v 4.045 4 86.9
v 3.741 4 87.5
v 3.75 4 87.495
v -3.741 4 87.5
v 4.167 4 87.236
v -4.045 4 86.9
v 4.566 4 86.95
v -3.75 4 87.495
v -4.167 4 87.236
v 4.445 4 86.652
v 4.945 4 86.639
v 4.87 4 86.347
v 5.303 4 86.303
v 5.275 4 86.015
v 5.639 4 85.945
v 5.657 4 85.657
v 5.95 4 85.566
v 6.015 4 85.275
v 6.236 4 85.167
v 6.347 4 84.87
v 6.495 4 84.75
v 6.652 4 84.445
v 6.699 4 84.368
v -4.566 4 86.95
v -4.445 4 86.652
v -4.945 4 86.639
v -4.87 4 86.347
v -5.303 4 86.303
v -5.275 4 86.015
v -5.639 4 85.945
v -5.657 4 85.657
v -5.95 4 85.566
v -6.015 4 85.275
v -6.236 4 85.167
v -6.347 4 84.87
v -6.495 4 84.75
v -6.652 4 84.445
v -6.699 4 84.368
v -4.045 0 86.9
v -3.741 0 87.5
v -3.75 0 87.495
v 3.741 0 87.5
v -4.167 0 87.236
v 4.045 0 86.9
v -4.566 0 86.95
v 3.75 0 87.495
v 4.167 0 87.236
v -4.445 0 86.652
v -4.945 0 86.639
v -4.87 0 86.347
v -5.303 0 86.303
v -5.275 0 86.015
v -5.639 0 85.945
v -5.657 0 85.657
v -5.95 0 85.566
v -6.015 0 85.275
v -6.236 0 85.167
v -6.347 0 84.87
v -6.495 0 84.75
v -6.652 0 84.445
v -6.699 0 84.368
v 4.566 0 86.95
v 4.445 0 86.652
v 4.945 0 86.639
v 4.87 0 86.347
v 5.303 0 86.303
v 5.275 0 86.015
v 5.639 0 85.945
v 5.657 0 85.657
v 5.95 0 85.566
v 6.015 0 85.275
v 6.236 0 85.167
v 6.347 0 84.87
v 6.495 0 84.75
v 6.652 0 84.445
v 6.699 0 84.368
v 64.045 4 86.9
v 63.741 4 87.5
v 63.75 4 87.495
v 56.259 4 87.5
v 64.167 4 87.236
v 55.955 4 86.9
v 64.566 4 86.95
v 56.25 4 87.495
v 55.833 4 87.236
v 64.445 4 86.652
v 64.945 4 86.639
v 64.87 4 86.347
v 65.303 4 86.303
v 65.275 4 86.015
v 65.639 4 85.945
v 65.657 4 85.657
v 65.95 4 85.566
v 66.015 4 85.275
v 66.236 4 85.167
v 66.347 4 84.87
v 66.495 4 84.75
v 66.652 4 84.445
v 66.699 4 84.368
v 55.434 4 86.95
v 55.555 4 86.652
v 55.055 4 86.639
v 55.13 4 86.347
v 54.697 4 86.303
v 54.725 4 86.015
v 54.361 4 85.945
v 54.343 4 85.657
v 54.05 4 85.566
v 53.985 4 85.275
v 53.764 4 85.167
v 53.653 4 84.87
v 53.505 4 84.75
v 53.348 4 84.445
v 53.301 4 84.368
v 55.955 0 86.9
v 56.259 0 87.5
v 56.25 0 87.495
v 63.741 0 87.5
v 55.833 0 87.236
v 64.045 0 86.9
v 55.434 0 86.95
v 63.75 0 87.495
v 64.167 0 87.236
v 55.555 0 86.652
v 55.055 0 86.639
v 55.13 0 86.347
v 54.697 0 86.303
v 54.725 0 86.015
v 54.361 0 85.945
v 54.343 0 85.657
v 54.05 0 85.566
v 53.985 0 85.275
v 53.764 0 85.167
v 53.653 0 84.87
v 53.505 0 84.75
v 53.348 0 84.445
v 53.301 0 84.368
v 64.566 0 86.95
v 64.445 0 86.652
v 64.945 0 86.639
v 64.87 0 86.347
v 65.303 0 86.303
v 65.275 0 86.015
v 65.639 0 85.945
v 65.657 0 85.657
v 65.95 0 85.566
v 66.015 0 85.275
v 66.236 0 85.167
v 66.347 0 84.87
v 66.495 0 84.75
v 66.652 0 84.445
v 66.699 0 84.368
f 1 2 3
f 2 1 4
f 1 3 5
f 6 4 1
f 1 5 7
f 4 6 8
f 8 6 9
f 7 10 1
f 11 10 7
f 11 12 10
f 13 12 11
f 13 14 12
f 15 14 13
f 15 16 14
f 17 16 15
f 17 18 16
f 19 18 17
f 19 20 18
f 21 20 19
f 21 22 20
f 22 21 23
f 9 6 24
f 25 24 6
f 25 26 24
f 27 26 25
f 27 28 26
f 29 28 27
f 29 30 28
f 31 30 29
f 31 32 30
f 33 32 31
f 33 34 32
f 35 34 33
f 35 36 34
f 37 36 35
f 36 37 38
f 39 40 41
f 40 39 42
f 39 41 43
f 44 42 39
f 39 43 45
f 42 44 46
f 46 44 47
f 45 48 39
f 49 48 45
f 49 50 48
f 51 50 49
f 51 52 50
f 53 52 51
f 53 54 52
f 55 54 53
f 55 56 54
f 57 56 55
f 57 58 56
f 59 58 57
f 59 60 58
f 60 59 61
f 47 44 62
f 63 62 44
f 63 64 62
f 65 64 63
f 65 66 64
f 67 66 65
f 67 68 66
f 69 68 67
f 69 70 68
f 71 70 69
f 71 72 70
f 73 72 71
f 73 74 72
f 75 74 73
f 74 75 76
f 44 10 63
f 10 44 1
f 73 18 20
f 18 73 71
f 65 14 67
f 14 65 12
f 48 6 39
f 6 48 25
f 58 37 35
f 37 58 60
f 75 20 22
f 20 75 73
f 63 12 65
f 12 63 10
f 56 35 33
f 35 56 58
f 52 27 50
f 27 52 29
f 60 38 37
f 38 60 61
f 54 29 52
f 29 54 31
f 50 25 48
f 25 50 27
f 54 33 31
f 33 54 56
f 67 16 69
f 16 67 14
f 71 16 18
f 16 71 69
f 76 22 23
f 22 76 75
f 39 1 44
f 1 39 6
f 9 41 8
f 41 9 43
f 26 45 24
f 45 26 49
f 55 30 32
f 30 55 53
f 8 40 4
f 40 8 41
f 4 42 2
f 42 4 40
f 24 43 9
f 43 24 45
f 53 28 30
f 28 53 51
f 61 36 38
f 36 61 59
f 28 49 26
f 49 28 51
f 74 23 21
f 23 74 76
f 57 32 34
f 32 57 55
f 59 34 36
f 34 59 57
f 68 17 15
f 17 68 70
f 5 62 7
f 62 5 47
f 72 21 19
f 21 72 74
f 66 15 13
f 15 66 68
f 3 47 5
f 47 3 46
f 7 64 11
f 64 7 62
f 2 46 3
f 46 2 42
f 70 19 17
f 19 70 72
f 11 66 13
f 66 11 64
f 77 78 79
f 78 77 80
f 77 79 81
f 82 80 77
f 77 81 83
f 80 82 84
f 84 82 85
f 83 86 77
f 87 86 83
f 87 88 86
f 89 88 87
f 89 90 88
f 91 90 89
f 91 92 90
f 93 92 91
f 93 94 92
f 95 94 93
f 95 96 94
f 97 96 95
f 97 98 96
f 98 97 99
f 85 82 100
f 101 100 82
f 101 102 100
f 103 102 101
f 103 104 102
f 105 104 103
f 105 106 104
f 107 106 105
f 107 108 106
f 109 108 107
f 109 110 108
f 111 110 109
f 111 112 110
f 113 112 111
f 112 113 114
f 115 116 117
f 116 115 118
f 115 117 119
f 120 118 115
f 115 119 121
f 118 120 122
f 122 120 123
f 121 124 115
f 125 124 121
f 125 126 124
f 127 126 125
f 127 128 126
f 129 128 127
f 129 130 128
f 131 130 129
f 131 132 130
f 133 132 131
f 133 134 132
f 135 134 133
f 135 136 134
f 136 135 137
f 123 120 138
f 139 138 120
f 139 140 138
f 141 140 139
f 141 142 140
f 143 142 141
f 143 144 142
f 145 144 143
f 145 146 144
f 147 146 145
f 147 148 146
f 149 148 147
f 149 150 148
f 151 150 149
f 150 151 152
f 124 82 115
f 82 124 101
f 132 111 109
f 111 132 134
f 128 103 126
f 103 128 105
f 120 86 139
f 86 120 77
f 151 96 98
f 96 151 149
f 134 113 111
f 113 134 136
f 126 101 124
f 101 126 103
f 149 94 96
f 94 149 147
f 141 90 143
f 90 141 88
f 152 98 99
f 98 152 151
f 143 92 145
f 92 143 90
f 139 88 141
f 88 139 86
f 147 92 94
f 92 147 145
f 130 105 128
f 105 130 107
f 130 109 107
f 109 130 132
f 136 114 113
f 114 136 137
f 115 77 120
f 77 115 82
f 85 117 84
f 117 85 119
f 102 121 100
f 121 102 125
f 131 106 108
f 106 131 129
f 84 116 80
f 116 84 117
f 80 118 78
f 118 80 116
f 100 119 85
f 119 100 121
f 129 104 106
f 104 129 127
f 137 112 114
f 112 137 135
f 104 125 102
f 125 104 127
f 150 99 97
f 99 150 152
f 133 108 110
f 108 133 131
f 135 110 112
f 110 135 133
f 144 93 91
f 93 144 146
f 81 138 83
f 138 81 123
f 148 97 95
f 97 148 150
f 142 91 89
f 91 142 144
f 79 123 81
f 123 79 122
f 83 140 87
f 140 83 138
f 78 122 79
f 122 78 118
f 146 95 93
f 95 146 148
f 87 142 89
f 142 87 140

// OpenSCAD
// file: ../stage.scad
// ============================================================
//  Positioning stage: base (X dovetail) -> x-slider with column
//  (Z dovetail) -> z-slider (payload face toward +Y) + column cap.
//  Every axis: M3 adjust screw captured in the fixed part by head +
//  nylock, threading into a captive nut in the moving part
//  (0.5 mm/turn, both directions), plus an M3 lock screw.
//  Modules model parts in stage-local coordinates at mid travel.
// ============================================================
include <lib.scad>

// Dovetail standing on the column's +Y face, running along Z.
// multmatrix maps (x,y,z) -> (y,z,x): run->Z, width->X, height->Y.
module zrail_frame() { multmatrix([[0,1,0,0],[0,0,1,0],[1,0,0,0]]) children(); }

module stage_base() {
    rail_x0 = -stage_L / 2;
    rail_len = stage_L - stage_tab_t;
    tab_h = stage_base_h + xs_screw_z + 6;
    difference() {
        union() {
            translate([-stage_L / 2, -stage_D / 2, 0]) cube([stage_L, stage_D, stage_base_h]);
            translate([rail_x0, 0, stage_base_h]) dovetail_rail(rail_len);
            // adjust-screw tab
            translate([stage_L / 2 - stage_tab_t, -8, 0]) cube([stage_tab_t, 16, tab_h]);
        }
        wood_screw_holes(stage_mount_pts, stage_base_h, cbore = 3);
        // X adjust screw through tab (head outside, nylock inside)
        translate([stage_L / 2 - stage_tab_t - 1, 0, stage_base_h + xs_screw_z])
            rotate([0, 90, 0]) screw_hole(m3_d, stage_tab_t + 2);
    }
}

// Upper stack shares the x-slider's X offset.
module stage_x_slider() {
    x0 = xs_xc - xs_len / 2;
    difference() {
        union() {
            translate([x0, -xs_w / 2, stage_base_h]) cube([xs_len, xs_w, xs_h]);
            // column
            translate([xs_xc - col_w / 2, col_y0, xs_top - 0.01]) cube([col_w, col_t, col_h + 0.01]);
            translate([xs_xc, col_y1, xs_top]) zrail_frame() dovetail_rail(col_h);
        }
        translate([x0 - 1, 0, stage_base_h]) dovetail_slot(xs_len + 2);
        // X adjust: screw enters +X face, nut dropped in from the top
        translate([x0 + xs_len + 0.01, 0, stage_base_h + xs_screw_z]) rotate([0, -90, 0])
            screw_hole(m3_d, xs_adj_hole);
        translate([x0 + xs_len - 6 - m3_nut_t / 2, -(m3_nut_af + clr) / 2, stage_base_h + xs_screw_z - 3.5])
            cube([m3_nut_t + 0.4, m3_nut_af + clr, xs_h]);
        // X lock: horizontal from +Y face onto rail flank, nut from top
        translate([xs_xc + 8, xs_w / 2 + 0.01, stage_base_h + 2.5]) rotate([90, 0, 0])
            screw_hole(m3_d, xs_w / 2 - 3);
        translate([xs_xc + 8 - (m3_nut_af + clr) / 2, 9 - (m3_nut_t + 0.4) / 2, stage_base_h + 2.5 - 3.3])
            cube([m3_nut_af + clr, m3_nut_t + 0.4, xs_h]);
        // cap screws (tapped into column top)
        for (sx = [-8, 8]) translate([xs_xc + sx, col_y0 + 5, col_top - 10])
            screw_hole(m3_tap, 10.1);
    }
}

module stage_z_slider() {
    y0 = col_y1;
    x0 = xs_xc - zs_w / 2;
    difference() {
        translate([x0, y0, zs_z0]) cube([zs_w, zs_t, zs_h]);
        translate([xs_xc, col_y1, zs_z0 - 1]) zrail_frame() dovetail_slot(zs_h + 2);
        // payload holes + nut slots from the bottom
        for (p = payload_pts) {
            translate([xs_xc + p[0], payload_face_y + 0.01, stage_payload_z + p[1]])
                rotate([90, 0, 0]) screw_hole(m3_d, 7.5);
            translate([xs_xc + p[0] - (m3_nut_af + clr) / 2, payload_face_y - 4 - (m3_nut_t + 0.4) / 2, zs_z0 - 1])
                cube([m3_nut_af + clr, m3_nut_t + 0.4, zs_h / 2 + 1 + 3.3]);
        }
        // Z adjust: through hole, nut slot from the -X side 5 below the top
        translate([xs_xc + zs_screw_x, zs_screw_y, zs_z0 + zs_h - zs_adj_hole]) screw_hole(m3_d, zs_adj_hole + 0.1);
        translate([x0 - 1, zs_screw_y - (m3_nut_af + clr) / 2, zs_z0 + zs_h - 5 - (m3_nut_t + 0.4) / 2])
            cube([zs_screw_x + zs_w / 2 + 1 + (m3_nut_af + clr) / 2, m3_nut_af + clr, m3_nut_t + 0.4]);
        // Z lock: from the +X (outward) side onto the rail flank, nut dropped in from the top
        lz = zs_z0 + zs_h - 5;
        x1 = x0 + zs_w;
        translate([x1 + 0.01, col_y1 + 2, lz]) rotate([0, -90, 0]) screw_hole(m3_d, zs_w / 2 - 4);
        translate([x1 - 2.5 - (m3_nut_t + 0.4), col_y1 + 2 - zl_pocket_w / 2, lz - (m3_nut_af + clr) / 2 / cos(30)])
            cube([m3_nut_t + 0.4, zl_pocket_w, zs_h]);
    }
}

module stage_z_cap() {
    difference() {
        // stops 1 mm short of the payload face so the payload never rubs it
        translate([xs_xc - col_w / 2, col_y0, col_top]) cube([col_w, payload_face_y - col_y0 - 1, cap_t]);
        for (sx = [-8, 8]) translate([xs_xc + sx, col_y0 + 5, col_top]) screw_hole(m3_d, cap_t);
        translate([xs_xc + zs_screw_x, zs_screw_y, col_top]) screw_hole(m3_d, cap_t);
    }
}

// ---- placed at a fine-travel offset (dx, dz) ----
module stage_x_slider_placed(dx = 0) { translate([dx, 0, 0]) stage_x_slider(); }
module stage_z_cap_placed(dx = 0)    { translate([dx, 0, 0]) stage_z_cap(); }
module stage_z_slider_placed(dx = 0, dz = 0) { translate([dx, 0, dz]) stage_z_slider(); }

// Children placed at the payload face centre (origin on the face, +Y out).
module stage_payload_origin(dx = 0, dz = 0) {
    translate([xs_xc + dx, payload_face_y, stage_payload_z + dz]) children();
}

// Optional mirror (tower B) wraps the stage-local geometry.
module stage_hand(mir) { if (mir) mirror([1, 0, 0]) children(); else children(); }

module stage_assembly(dx = 0, dz = 0) {
    color("SteelBlue") stage_base();
    color("LightSteelBlue") stage_x_slider_placed(dx);
    color("SkyBlue") stage_z_cap_placed(dx);
    color("CadetBlue") stage_z_slider_placed(dx, dz);
}

// ---- travel checks ----
_right_gap = (stage_L / 2 - stage_tab_t) - (xs_xc + xs_len / 2) - locknut_t;
_left_ok   = 10;   // slider may overhang the rail start by up to 10 mm
echo("CHECK", "stage_travel_x", 2 * min(_right_gap, _left_ok));
// adjust screws: head on the fixed tab/cap, tip must pass the moving nut
// at the far travel end and stay inside the hole at the near end
_xnut = xs_xc + xs_len / 2 - 6;                  // nut centre X at mid
_xtip = stage_L / 2 - x_adj_len;
echo("CHECK", "x_adj_engage", (_xnut - stage_travel - (m3_nut_t + 0.4) / 2) - _xtip);
echo("CHECK", "x_adj_hole", _xtip - (xs_xc + xs_len / 2 + stage_travel - xs_adj_hole));
_znut = zs_z0 + zs_h - 5;
_ztip = stage_top_z - z_adj_len;
echo("CHECK", "z_adj_engage", (_znut - stage_travel - (m3_nut_t + 0.4) / 2) - _ztip);
echo("CHECK", "z_adj_hole", _ztip - (zs_z0 + zs_h + stage_travel - zs_adj_hole));
echo("CHECK", "z_lock_pocket_w", zl_pocket_w);
echo("CHECK", "stage_travel_z", 2 * min(stage_gap_z, cap_gap - locknut_t));
// file: ../axes.scad
// ============================================================
//  Plug carriage: X base (fixed, X servo) -> X carriage (rack on
//  its -Y face, Y servo) -> Y carriage (rack on its -X face, male
//  stage pad, cable pillar).
//  World coords; carriage modules take x_pos (plug X) / y_pos.
// ============================================================
include <stage.scad>

runner_w = 10;     // plain (non-dovetail) rear X runner
runner_h = dt_h;

// ---------------- X base ----------------
xb_x0 = x_rail_x0 - 6;
xb_x1 = x_rail_x0 + x_rail_len + 6;
xb_y0 = x_shaft_y - servo_body[0] + servo_shaft_off - 12;
xb_y1 = xc_y1;
xb_screws = [[xb_x0 + 7, xb_y0 + 7], [xb_x1 - 7, xb_y0 + 7],
             [xb_x0 + 7, xb_y1 - 7], [xb_x1 - 7, xb_y1 - 7],
             [(xb_x0 + xb_x1) / 2, xb_y1 - 7]];

module x_servo_holder_world() {
    at_inverted_servo(x_shaft_x, x_shaft_y, x_pinion_z0, 90) mg995_holder();
}
// Holder floor-screw holes, mapped from the holder frame to the floor.
module x_holder_floor_holes() {
    at_inverted_servo(x_shaft_x, x_shaft_y, x_pinion_z0, 90) translate([0, 0, holder_floor_up])
        mirror([0, 0, 1]) translate([0, 0, -xb_t]) holder_floor_holes(xb_t);
}
module x_servo_world() {
    at_inverted_servo(x_shaft_x, x_shaft_y, x_pinion_z0, 90) mg995_model();
    x_servo_holder_world();
}
module x_pinion_world() {
    translate([x_shaft_x, x_shaft_y, x_pinion_z0]) color("Gold") pinion();
}

module x_base() {
    difference() {
        union() {
            translate([xb_x0, xb_y0, 0]) cube([xb_x1 - xb_x0, xb_y1 - xb_y0, xb_t]);
            translate([x_rail_x0, x_rail_y[1], xb_t]) dovetail_rail(x_rail_len);
            translate([x_rail_x0, x_rail_y[0] - runner_w / 2, xb_t - 0.01])
                cube([x_rail_len, runner_w, runner_h + 0.01]);
        }
        wood_screw_holes(xb_screws, xb_t, cbore = 2);
        x_holder_floor_holes();
        // pinion clearance pocket (keeps the plate clear of the gear)
        translate([x_shaft_x, x_shaft_y, xb_t - 1]) cylinder(r = pinion_pd / 2 + gear_mod + 1, h = 2);
        // servo-lead exit notch at the rear edge, plus zip-tie slots
        translate([x_shaft_x - 6, xb_y0 - 1, -1]) cube([12, 8, xb_t + 2]);
        for (dx = [-10, 10]) translate([x_shaft_x + dx - 1.5, xb_y0 + 12, -1]) cube([3, 5, xb_t + 2]);
    }
}

// ---------------- X carriage (modelled at x_pos = 0) ----------------
module y_servo_holder_local() {
    at_inverted_servo(y_shaft_x_rel, y_shaft_y, y_pinion_z0, 90) mg995_holder();
}
module y_holder_floor_holes() {
    at_inverted_servo(y_shaft_x_rel, y_shaft_y, y_pinion_z0, 90) translate([0, 0, holder_floor_up])
        mirror([0, 0, 1]) translate([0, 0, -xc_h]) holder_floor_holes(xc_h);
}
module y_servo_local() {
    at_inverted_servo(y_shaft_x_rel, y_shaft_y, y_pinion_z0, 90) mg995_model();
}

module x_carriage() {
    difference() {
        union() {
            translate([xc_x0, xc_y0, xc_z0]) cube([xc_len, xc_y1 - xc_y0, xc_h]);
            // X rack on the -Y face, teeth toward -Y
            translate([xc_x0, xc_y0 + 0.01, x_rack_z0]) mirror([0, 1, 0]) rack(xc_len, base_h = rack_base);
            // Y rail on top, under the Y carriage
            translate([-xs_xc, xc_y0, xc_top]) rotate([0, 0, 90]) dovetail_rail(xc_y1 - xc_y0);
        }
        y_holder_floor_holes();
        translate([xc_x0 - 1, x_rail_y[1], xc_z0]) dovetail_slot(xc_len + 2);
        translate([xc_x0 - 1, x_rail_y[0] - runner_w / 2 - clr - 0.15, xc_z0 - 1])
            cube([xc_len + 2, runner_w + 2 * clr + 0.3, runner_h + clr + 1]);
        translate([xc_x0 - 1, x_rail_y[0], xc_z0]) rotate([90, 0, 90]) linear_extrude(xc_len + 2)
            chamfer_mouth(runner_w + 2 * clr + 0.3);
        // lightening / Y-servo lead pass-through + zip-tie slots
        translate([y_shaft_x_rel - 6, xc_y0 + 3, xc_top - 4]) cube([12, 6, 5]);
        for (dy = [12, 24]) translate([xc_x0 + 3, xc_y0 + dy, xc_z0 + runner_h + 2]) cube([5, 3, xc_h]);
    }
}
module x_carriage_world(x_pos) { translate([x_pos, 0, 0]) x_carriage(); }
module y_servo_world(x_pos) { translate([x_pos, 0, 0]) { y_servo_local(); y_servo_holder_local(); } }
module y_pinion_world(x_pos) {
    translate([x_pos + y_shaft_x_rel, y_shaft_y, y_pinion_z0]) color("Gold") pinion();
}

echo("CHECK", "x_rail_len", x_rail_len);
// X base front edge to the port towers' base front edge (Y)
echo("CHECK", "xbase_tower_gap", (tower_y - stage_D / 2) - xb_y1);
echo("CHECK", "x_mesh_gap", (x_pitch_y - x_shaft_y) - pinion_pd / 2);
echo("CHECK", "x_travel_needed", x_pos_max - x_pos_min);

// ---------------- Y carriage (coords relative to male stage origin
//                  in X/Y, world Z) ----------------
pillar_w   = 16;
// top of the flexure frame (mirrors plug_mount.scad) + 6 so the cable clears it
pillar_top = port_z + plug_drop - 1 + flex_isl_h + 6 + 5 + 6;

module y_carriage() {
    difference() {
        union() {
            translate([yc_x0, yc_y0, yc_z0]) cube([yc_x1 - yc_x0, yc_len, yc_h]);
            // Y rack on the -X face, teeth toward -X
            translate([yc_x0 + 0.01, yc_y0, y_rack_z0]) rotate([0, 0, 90]) rack(yc_len, base_h = rack_base);
            // cable strain-relief pillar at the rear, in line with the plug
            translate([xs_xc - pillar_w / 2, yc_y0, yc_z0]) cube([pillar_w, yc_pillar_d, pillar_top - yc_z0]);
        }
        translate([0, yc_y0 - 1, yc_z0]) rotate([0, 0, 90]) dovetail_slot(yc_len + 2);
        // M4 bolts up through captive nuts into the stage base
        for (p = stage_mount_pts) translate([p[0], p[1], yc_z0]) {
            screw_hole(m4_d, yc_h);
            translate([0, 0, -0.01]) m4_nut_trap(m4_nut_t + 0.5);
        }
        // two zip-tie slots through the pillar, near its front face
        for (dz = [6, 18]) translate([xs_xc - pillar_w / 2 - 1, yc_y0 + yc_pillar_d - 5.5, pillar_top - dz])
            cube([pillar_w + 2, 3, 5]);
    }
}
module y_carriage_world(x_pos, y_pos) {
    o = ms_origin(x_pos, y_pos);
    translate([o[0], o[1], 0]) y_carriage();
}

echo("CHECK", "m4_stage_bolt_protrude", m4_stage_bolt_len - ((stage_base_h - 3) + yc_h));
echo("CHECK", "y_mesh_gap", ((y_pitch_x_rel - xs_xc) - y_shaft_x_rel) - pinion_pd / 2);
echo("CHECK", "pillar_top_z", pillar_top);
echo("CHECK", "pillar_min", port_z + 25);
// rack length left past the pinion centre at the worst travel end
echo("CHECK", "x_rack_engage_min",
     min(x_shaft_x - (x_pos_max + xc_x0), (x_pos_min + xc_x1) - x_shaft_x));
echo("CHECK", "y_rack_engage_min",
     min(y_shaft_y - (ms_origin(0, y_travel)[1] + yc_y0), (ms_origin(0, 0)[1] + yc_y1) - y_shaft_y));
// file: ../port_tower.scad
// ============================================================
//  Female port tower: positioning stage (rotated 180 deg so its
//  payload face looks toward -Y) + bracket plate with the keyed
//  D-hole. The bulkhead goes in from the back (flange behind the
//  plate), nut on the front. Plate front face is at world y=0.
// ============================================================
include <stage.scad>

bracket_w      = 36;
bracket_hole_dz = port_z - stage_payload_z;   // hole above payload centre
bracket_bot    = -zs_h / 2;
bracket_top    = bracket_hole_dz + bh_nut_af / cos(30) / 2 + 3;
rib_t          = 5;     // rib width (X)
rib_d          = 7;     // rib depth (out of the plate front)

// Payload-face coordinates: origin at face centre, +Y away from the stage.
module port_bracket() {
    difference() {
        union() {
            translate([-bracket_w / 2, 0, bracket_bot]) cube([bracket_w, plate_t, bracket_top - bracket_bot]);
            // stiffening ribs, outboard of the nut and clear of the plug clamp
            for (sx = [-1, 1])
                translate([sx > 0 ? bracket_w / 2 - rib_t : -bracket_w / 2, plate_t - 0.01, bracket_bot])
                    hull() {
                        cube([rib_t, rib_d, 1]);
                        translate([0, 0, bracket_hole_dz - 14]) cube([rib_t, 0.01, 1]);
                    }
        }
        // keyed D-hole, flat on top
        translate([0, plate_t, bracket_hole_dz]) rotate([90, 0, 0]) d_hole(t = plate_t);
        // mounting screws into the z-slider's captive nuts
        for (p = payload_pts) translate([p[0], -0.01, p[1]]) rotate([-90, 0, 0]) {
            screw_hole(m3_d, plate_t + rib_d);
        }
    }
}

// Whole tower in world coordinates at fine-travel offset (dx, dz),
// measured in world X / Z.
// Tower B (i=1) is the mirror image so its X adjust screw faces outward.
module port_tower_world(i, dx = 0, dz = 0) {
    ldx = i == 0 ? -dx : dx;   // world dx -> stage-local dx
    translate([tower_x(i), tower_y, 0]) rotate([0, 0, 180]) stage_hand(i == 1) {
        stage_assembly(ldx, dz);
        stage_payload_origin(ldx, dz) color("Orange") port_bracket();
    }
}

// Bulkhead connector stand-in (for checks / preview), world coords.
module bulkhead_world(i, dx = 0, dz = 0) {
    translate([port_x[i] + dx, port_face_y, port_z + dz]) rotate([90, 0, 0]) color("DimGray") {
        cylinder(d = bh_thread_d, h = bh_thread_len - plate_t);                   // thread + face
        cylinder(d = bh_nut_af / cos(30), h = bh_nut_t, $fn = 6);                  // nut
        translate([0, 0, -plate_t - 2]) cylinder(d = bh_flange_d, h = 2);          // flange
        translate([0, 0, -plate_t - 40]) cylinder(d = 14, h = 38);                 // body
    }
}

echo("CHECK", "port_z", port_z);
// file: ../plug_mount.scad
// ============================================================
//  Male plug mount: flexure (frame + 4 L-beams + floating island with
//  the clamp cradle built in), clamp cap, and two identical stop
//  straps (front + back) whose pins limit X/Z float to +/-flex_float
//  and whose 1 mm standoff limits Y float to +/-flex_stop_gap.
//  Local coords: origin at the stage payload face centre, +Y away from
//  the stage, Z relative to the payload centre.
// ============================================================
include <port_tower.scad>
include <axes.scad>

plug_dz  = port_z - (yc_top + stage_payload_z);   // plug centre above payload centre
blk_x    = plug_bx / 2 + 0.1;           // snug in X
blk_y0   = flex_t + clamp_wall;                   // block back face
blk_y1   = blk_y0 + plug_by;                // block front face
blk_z0   = plug_dz + plug_drop;                   // block bottom
blk_z1   = blk_z0 + plug_block[2];
crad_x   = blk_x + 5;                             // cradle half width
crad_y1  = blk_y1 - 0.4;                          // cradle stops short: cap clamps the block
cap_back_y = crad_y1;
crad_scr = blk_x + 2.5;                           // cradle screw X
clamp_ledge = 0.5;                                // keeps clamp >= 12.5 above plug centre

isl_x    = 19;                                    // island half width
isl_z0   = blk_z0 - 1;
isl_z1   = isl_z0 + flex_isl_h;
flex_g   = 6;                                     // island-to-frame gap
in_x     = isl_x + flex_g;
in_z0    = isl_z0 - flex_g;
in_z1    = isl_z1 + flex_g;
fr_bar   = 5;
fr_x     = in_x + fr_bar;
fr_z0    = -zs_h / 2;
fr_z1    = in_z1 + fr_bar;

pin_d    = 4;
pin_z    = isl_z1 - 4;
pin_hole = pin_d + 2 * flex_float;
strap_w  = 8;
strap_t  = 3;
strap_foot_w = 18;
strap_z0 = pin_z - 4;
strap_scr = [-5, 5];                              // strap screw X (through the top bar)
strap_scr_z = (in_z1 + fr_z1) / 2;

// one L-beam: island bottom face -> down -> outward -> up -> frame side
leg = 3;
function beam_path(sx, sz) = let(zc = (isl_z0 + isl_z1) / 2,
    zi = sz < 0 ? isl_z0 : isl_z1,
    zh = zi + sz * leg,
    zv = zc + sz * (flex_g - 2 + 0.5),
    xv = sx * (isl_x + leg))
    [[sx * 10, zi], [sx * 10, zh], [xv, zh], [xv, zv], [sx * in_x, zv]];

module poly_beam(pts, w) {
    for (k = [0:len(pts) - 2]) hull() {
        translate(pts[k]) square(w, center = true);
        translate(pts[k + 1]) square(w, center = true);
    }
}

// XZ outline helpers: 2D (x, z) extruded along +Y from y0, thickness t
module xz_extrude(y0, t) { translate([0, y0 + t, 0]) rotate([90, 0, 0]) linear_extrude(t) children(); }

module plug_flexure() {
    difference() {
        union() {
            xz_extrude(0, flex_t) {
                difference() {
                    translate([-fr_x, fr_z0]) square([2 * fr_x, fr_z1 - fr_z0]);
                    translate([-in_x, in_z0]) square([2 * in_x, in_z1 - in_z0]);
                }
                translate([-isl_x, isl_z0]) square([2 * isl_x, isl_z1 - isl_z0]);
                for (sx = [-1, 1], sz = [-1, 1]) poly_beam(beam_path(sx, sz), flex_beam_w);
            }
            // clamp cradle on the island front: back wall + side walls
            translate([-crad_x, flex_t - 0.01, blk_z0]) cube([2 * crad_x, clamp_wall + 0.01, plug_block[2]]);
            for (sx = [-1, 1]) translate([sx > 0 ? blk_x : -crad_x, blk_y0 - 0.01, blk_z0])
                cube([crad_x - blk_x, crad_y1 - blk_y0 + 0.01, plug_block[2]]);
            // Z retention: thin ledge under the block, lips over its top corners
            translate([-crad_x, blk_y0 - 0.01, blk_z0 - clamp_ledge]) cube([2 * crad_x, crad_y1 - blk_y0 + 0.01, clamp_ledge]);
            for (sx = [-1, 1]) translate([sx > 0 ? blk_x - 1 : -crad_x, blk_y0 - 0.01, blk_z1])
                cube([crad_x - blk_x + 1, crad_y1 - blk_y0 + 0.01, 1.5]);
        }
        // payload screws into the stage z-slider
        for (p = payload_pts) translate([p[0], -0.01, p[1]]) rotate([-90, 0, 0]) screw_hole(m3_d, flex_t);
        // stop-pin hole (through) and strap screws (through the top bar)
        translate([0, -0.01, pin_z]) rotate([-90, 0, 0]) screw_hole(pin_hole, flex_t);
        for (x = strap_scr) translate([x, -0.01, strap_scr_z]) rotate([-90, 0, 0]) screw_hole(m3_d, flex_t);
        // cap screws, tapped into the cradle side walls
        for (sx = [-1, 1]) translate([sx * crad_scr, crad_y1 + 0.01, (blk_z0 + blk_z1) / 2])
            rotate([90, 0, 0]) screw_hole(m3_tap, crad_y1 - flex_t + 1);
    }
}

// Clamp cap: 1.5 mm over the block, thicker over the screws.
module plug_clamp_cap() {
    // flat back at the cradle front: squeezes the block (it stands 0.4 proud)
    difference() {
        union() {
            translate([-crad_x, cap_back_y, blk_z0]) cube([2 * crad_x, blk_y1 - cap_back_y + clamp_lip_t, plug_block[2]]);
            for (sx = [-1, 1]) translate([sx > 0 ? blk_x : -crad_x, cap_back_y, blk_z0])
                cube([crad_x - blk_x, 4, plug_block[2]]);
        }
        for (sx = [-1, 1]) translate([sx * crad_scr, cap_back_y - 0.01, (blk_z0 + blk_z1) / 2])
            rotate([-90, 0, 0]) screw_hole(m3_d, 5);
    }
}

// Stop strap in its own frame: back face on y=0, pin toward -Y.
module plug_flex_stop() {
    difference() {
        union() {
            translate([-strap_w / 2, 0, strap_z0]) cube([strap_w, strap_t, fr_z1 - strap_z0]);
            translate([-strap_foot_w / 2, -flex_stop_gap, in_z1]) cube([strap_foot_w, strap_t + flex_stop_gap, fr_z1 - in_z1]);
            translate([0, 0.01, pin_z]) rotate([90, 0, 0]) cylinder(d = pin_d, h = flex_stop_gap + 2);
        }
        for (x = strap_scr) translate([x, -flex_stop_gap - 0.01, strap_scr_z]) rotate([-90, 0, 0])
            screw_hole(m3_d, strap_t + flex_stop_gap);
    }
}

module plug_flex_stops_placed() {
    translate([0, flex_t + flex_stop_gap, 0]) plug_flex_stop();                       // front
    translate([0, -flex_stop_gap, 0]) mirror([0, 1, 0]) plug_flex_stop();            // back
}

module plug_body_local() {
    color("White") {
        translate([-plug_bx / 2, blk_y0, blk_z0]) cube([plug_bx, plug_by, plug_block[2]]);
        translate([0, blk_y0 + plug_by / 2, blk_z1]) cylinder(d = 4.5, h = 15);              // cable
        hull() {
            translate([-plug_bx / 2, blk_y0, plug_dz - 4]) cube([plug_bx, plug_by, blk_z0 - plug_dz + 4]);
            translate([0, blk_y1 + plug_head_proj - 1, plug_dz]) rotate([-90, 0, 0]) cylinder(d = 8, h = 1);
        }
    }
}

// Everything that moves with the plug carriage, minus the plug itself.
module plug_mount_world(x_pos, y_pos, dx = 0, dz = 0) {
    o = ms_origin(x_pos, y_pos);
    translate(o) {
        stage_assembly(dx, dz);
        stage_payload_origin(dx, dz) {
            color("Orange") plug_flexure();
            color("Gold") plug_clamp_cap();
            color("Khaki") plug_flex_stops_placed();
        }
    }
}
module plug_body_world(x_pos, y_pos, dx = 0, dz = 0) {
    o = ms_origin(x_pos, y_pos);
    translate(o) stage_payload_origin(dx, dz) plug_body_local();
}

// ---- checks ----
echo("CHECK", "clamp_lip_t", clamp_lip_t);
echo("CHECK", "clamp_preload", blk_y1 - cap_back_y);
echo("CHECK", "clamp_x_play", blk_x - plug_bx / 2);
echo("CHECK", "pillar_above_flex", pillar_top - (yc_top + stage_payload_z + fr_z1));
echo("CHECK", "clamp_bottom_above_plug", blk_z0 - clamp_ledge - plug_dz);
echo("CHECK", "plug_insert_err",
     (ms_origin(0, y_travel)[1] + payload_face_y + blk_y1 + plug_head_proj) - bh_face_y);
echo("CHECK", "flex_xz_stop", (pin_hole - pin_d) / 2);
// beam-to-island and beam-to-frame clearance must exceed the stop travel
echo("CHECK", "flex_beam_clear", leg - flex_beam_w / 2);
// file: ../assembly_lib.scad
// World-placement groups shared by assembly.scad and the full-machine
// collision test. Pinions are left out of these groups because they
// mesh with the racks by design.
include <plug_mount.scad>

module fixed_world() {
    for (i = [0, 1]) { port_tower_world(i); bulkhead_world(i); }
    color("Tan") x_base();
    x_servo_world();
}

module moving_world(x_pos, y_pos) {
    color("LightGreen") x_carriage_world(x_pos);
    y_servo_world(x_pos);
    color("Yellow") y_carriage_world(x_pos, y_pos);
    plug_mount_world(x_pos, y_pos);
}
// file: probe_lib.scad
// Fit probes built only from the port position and the measured part
// sizes (not from the bracket / clamp variables), so they test the real
// geometry rather than restating its formulas.
include <../assembly_lib.scad>

// Bulkhead thread cross-section (15 mm, flat 6.5 mm from centre, on top)
// pushed through port i's plate, offset by d = [dx, dz].
module probe_port_thread(i, d) {
    translate([port_x[i] + d[0], port_face_y + plate_t + 1, port_z + d[1]]) rotate([90, 0, 0])
        linear_extrude(plate_t + 2) intersection() {
            circle(d = bh_thread_d, $fn = 96);
            translate([-bh_thread_d, -bh_thread_d]) square([2 * bh_thread_d, bh_thread_d + bh_flat]);
        }
}
module probe_port_hole(d) {
    for (i = [0, 1]) intersection() { port_tower_world(i); probe_port_thread(i, d); }
}

// Plug clamp block where it must sit for the magnetic face to meet port
// i's face: face centre at (port_x, bh_face_y, port_z).
module probe_block(i, d) {
    translate([port_x[i] - plug_bx / 2 + d[0],
               bh_face_y - plug_head_proj - plug_by + d[1],
               port_z + plug_drop + d[2]])
        cube([plug_bx, plug_by, plug_block[2]]);
}
// Seat = flexure cradle only (the cap squeezes the block on purpose).
module probe_plug_seat(d) {
    for (i = [0, 1]) intersection() {
        translate(ms_origin(port_x[i], y_travel)) stage_payload_origin() plug_flexure();
        probe_block(i, d);
    }
}
// main file
// 1 mm high: the thread must hit the D flat.
include <probe_lib.scad>
probe_port_hole([0, 1]);
